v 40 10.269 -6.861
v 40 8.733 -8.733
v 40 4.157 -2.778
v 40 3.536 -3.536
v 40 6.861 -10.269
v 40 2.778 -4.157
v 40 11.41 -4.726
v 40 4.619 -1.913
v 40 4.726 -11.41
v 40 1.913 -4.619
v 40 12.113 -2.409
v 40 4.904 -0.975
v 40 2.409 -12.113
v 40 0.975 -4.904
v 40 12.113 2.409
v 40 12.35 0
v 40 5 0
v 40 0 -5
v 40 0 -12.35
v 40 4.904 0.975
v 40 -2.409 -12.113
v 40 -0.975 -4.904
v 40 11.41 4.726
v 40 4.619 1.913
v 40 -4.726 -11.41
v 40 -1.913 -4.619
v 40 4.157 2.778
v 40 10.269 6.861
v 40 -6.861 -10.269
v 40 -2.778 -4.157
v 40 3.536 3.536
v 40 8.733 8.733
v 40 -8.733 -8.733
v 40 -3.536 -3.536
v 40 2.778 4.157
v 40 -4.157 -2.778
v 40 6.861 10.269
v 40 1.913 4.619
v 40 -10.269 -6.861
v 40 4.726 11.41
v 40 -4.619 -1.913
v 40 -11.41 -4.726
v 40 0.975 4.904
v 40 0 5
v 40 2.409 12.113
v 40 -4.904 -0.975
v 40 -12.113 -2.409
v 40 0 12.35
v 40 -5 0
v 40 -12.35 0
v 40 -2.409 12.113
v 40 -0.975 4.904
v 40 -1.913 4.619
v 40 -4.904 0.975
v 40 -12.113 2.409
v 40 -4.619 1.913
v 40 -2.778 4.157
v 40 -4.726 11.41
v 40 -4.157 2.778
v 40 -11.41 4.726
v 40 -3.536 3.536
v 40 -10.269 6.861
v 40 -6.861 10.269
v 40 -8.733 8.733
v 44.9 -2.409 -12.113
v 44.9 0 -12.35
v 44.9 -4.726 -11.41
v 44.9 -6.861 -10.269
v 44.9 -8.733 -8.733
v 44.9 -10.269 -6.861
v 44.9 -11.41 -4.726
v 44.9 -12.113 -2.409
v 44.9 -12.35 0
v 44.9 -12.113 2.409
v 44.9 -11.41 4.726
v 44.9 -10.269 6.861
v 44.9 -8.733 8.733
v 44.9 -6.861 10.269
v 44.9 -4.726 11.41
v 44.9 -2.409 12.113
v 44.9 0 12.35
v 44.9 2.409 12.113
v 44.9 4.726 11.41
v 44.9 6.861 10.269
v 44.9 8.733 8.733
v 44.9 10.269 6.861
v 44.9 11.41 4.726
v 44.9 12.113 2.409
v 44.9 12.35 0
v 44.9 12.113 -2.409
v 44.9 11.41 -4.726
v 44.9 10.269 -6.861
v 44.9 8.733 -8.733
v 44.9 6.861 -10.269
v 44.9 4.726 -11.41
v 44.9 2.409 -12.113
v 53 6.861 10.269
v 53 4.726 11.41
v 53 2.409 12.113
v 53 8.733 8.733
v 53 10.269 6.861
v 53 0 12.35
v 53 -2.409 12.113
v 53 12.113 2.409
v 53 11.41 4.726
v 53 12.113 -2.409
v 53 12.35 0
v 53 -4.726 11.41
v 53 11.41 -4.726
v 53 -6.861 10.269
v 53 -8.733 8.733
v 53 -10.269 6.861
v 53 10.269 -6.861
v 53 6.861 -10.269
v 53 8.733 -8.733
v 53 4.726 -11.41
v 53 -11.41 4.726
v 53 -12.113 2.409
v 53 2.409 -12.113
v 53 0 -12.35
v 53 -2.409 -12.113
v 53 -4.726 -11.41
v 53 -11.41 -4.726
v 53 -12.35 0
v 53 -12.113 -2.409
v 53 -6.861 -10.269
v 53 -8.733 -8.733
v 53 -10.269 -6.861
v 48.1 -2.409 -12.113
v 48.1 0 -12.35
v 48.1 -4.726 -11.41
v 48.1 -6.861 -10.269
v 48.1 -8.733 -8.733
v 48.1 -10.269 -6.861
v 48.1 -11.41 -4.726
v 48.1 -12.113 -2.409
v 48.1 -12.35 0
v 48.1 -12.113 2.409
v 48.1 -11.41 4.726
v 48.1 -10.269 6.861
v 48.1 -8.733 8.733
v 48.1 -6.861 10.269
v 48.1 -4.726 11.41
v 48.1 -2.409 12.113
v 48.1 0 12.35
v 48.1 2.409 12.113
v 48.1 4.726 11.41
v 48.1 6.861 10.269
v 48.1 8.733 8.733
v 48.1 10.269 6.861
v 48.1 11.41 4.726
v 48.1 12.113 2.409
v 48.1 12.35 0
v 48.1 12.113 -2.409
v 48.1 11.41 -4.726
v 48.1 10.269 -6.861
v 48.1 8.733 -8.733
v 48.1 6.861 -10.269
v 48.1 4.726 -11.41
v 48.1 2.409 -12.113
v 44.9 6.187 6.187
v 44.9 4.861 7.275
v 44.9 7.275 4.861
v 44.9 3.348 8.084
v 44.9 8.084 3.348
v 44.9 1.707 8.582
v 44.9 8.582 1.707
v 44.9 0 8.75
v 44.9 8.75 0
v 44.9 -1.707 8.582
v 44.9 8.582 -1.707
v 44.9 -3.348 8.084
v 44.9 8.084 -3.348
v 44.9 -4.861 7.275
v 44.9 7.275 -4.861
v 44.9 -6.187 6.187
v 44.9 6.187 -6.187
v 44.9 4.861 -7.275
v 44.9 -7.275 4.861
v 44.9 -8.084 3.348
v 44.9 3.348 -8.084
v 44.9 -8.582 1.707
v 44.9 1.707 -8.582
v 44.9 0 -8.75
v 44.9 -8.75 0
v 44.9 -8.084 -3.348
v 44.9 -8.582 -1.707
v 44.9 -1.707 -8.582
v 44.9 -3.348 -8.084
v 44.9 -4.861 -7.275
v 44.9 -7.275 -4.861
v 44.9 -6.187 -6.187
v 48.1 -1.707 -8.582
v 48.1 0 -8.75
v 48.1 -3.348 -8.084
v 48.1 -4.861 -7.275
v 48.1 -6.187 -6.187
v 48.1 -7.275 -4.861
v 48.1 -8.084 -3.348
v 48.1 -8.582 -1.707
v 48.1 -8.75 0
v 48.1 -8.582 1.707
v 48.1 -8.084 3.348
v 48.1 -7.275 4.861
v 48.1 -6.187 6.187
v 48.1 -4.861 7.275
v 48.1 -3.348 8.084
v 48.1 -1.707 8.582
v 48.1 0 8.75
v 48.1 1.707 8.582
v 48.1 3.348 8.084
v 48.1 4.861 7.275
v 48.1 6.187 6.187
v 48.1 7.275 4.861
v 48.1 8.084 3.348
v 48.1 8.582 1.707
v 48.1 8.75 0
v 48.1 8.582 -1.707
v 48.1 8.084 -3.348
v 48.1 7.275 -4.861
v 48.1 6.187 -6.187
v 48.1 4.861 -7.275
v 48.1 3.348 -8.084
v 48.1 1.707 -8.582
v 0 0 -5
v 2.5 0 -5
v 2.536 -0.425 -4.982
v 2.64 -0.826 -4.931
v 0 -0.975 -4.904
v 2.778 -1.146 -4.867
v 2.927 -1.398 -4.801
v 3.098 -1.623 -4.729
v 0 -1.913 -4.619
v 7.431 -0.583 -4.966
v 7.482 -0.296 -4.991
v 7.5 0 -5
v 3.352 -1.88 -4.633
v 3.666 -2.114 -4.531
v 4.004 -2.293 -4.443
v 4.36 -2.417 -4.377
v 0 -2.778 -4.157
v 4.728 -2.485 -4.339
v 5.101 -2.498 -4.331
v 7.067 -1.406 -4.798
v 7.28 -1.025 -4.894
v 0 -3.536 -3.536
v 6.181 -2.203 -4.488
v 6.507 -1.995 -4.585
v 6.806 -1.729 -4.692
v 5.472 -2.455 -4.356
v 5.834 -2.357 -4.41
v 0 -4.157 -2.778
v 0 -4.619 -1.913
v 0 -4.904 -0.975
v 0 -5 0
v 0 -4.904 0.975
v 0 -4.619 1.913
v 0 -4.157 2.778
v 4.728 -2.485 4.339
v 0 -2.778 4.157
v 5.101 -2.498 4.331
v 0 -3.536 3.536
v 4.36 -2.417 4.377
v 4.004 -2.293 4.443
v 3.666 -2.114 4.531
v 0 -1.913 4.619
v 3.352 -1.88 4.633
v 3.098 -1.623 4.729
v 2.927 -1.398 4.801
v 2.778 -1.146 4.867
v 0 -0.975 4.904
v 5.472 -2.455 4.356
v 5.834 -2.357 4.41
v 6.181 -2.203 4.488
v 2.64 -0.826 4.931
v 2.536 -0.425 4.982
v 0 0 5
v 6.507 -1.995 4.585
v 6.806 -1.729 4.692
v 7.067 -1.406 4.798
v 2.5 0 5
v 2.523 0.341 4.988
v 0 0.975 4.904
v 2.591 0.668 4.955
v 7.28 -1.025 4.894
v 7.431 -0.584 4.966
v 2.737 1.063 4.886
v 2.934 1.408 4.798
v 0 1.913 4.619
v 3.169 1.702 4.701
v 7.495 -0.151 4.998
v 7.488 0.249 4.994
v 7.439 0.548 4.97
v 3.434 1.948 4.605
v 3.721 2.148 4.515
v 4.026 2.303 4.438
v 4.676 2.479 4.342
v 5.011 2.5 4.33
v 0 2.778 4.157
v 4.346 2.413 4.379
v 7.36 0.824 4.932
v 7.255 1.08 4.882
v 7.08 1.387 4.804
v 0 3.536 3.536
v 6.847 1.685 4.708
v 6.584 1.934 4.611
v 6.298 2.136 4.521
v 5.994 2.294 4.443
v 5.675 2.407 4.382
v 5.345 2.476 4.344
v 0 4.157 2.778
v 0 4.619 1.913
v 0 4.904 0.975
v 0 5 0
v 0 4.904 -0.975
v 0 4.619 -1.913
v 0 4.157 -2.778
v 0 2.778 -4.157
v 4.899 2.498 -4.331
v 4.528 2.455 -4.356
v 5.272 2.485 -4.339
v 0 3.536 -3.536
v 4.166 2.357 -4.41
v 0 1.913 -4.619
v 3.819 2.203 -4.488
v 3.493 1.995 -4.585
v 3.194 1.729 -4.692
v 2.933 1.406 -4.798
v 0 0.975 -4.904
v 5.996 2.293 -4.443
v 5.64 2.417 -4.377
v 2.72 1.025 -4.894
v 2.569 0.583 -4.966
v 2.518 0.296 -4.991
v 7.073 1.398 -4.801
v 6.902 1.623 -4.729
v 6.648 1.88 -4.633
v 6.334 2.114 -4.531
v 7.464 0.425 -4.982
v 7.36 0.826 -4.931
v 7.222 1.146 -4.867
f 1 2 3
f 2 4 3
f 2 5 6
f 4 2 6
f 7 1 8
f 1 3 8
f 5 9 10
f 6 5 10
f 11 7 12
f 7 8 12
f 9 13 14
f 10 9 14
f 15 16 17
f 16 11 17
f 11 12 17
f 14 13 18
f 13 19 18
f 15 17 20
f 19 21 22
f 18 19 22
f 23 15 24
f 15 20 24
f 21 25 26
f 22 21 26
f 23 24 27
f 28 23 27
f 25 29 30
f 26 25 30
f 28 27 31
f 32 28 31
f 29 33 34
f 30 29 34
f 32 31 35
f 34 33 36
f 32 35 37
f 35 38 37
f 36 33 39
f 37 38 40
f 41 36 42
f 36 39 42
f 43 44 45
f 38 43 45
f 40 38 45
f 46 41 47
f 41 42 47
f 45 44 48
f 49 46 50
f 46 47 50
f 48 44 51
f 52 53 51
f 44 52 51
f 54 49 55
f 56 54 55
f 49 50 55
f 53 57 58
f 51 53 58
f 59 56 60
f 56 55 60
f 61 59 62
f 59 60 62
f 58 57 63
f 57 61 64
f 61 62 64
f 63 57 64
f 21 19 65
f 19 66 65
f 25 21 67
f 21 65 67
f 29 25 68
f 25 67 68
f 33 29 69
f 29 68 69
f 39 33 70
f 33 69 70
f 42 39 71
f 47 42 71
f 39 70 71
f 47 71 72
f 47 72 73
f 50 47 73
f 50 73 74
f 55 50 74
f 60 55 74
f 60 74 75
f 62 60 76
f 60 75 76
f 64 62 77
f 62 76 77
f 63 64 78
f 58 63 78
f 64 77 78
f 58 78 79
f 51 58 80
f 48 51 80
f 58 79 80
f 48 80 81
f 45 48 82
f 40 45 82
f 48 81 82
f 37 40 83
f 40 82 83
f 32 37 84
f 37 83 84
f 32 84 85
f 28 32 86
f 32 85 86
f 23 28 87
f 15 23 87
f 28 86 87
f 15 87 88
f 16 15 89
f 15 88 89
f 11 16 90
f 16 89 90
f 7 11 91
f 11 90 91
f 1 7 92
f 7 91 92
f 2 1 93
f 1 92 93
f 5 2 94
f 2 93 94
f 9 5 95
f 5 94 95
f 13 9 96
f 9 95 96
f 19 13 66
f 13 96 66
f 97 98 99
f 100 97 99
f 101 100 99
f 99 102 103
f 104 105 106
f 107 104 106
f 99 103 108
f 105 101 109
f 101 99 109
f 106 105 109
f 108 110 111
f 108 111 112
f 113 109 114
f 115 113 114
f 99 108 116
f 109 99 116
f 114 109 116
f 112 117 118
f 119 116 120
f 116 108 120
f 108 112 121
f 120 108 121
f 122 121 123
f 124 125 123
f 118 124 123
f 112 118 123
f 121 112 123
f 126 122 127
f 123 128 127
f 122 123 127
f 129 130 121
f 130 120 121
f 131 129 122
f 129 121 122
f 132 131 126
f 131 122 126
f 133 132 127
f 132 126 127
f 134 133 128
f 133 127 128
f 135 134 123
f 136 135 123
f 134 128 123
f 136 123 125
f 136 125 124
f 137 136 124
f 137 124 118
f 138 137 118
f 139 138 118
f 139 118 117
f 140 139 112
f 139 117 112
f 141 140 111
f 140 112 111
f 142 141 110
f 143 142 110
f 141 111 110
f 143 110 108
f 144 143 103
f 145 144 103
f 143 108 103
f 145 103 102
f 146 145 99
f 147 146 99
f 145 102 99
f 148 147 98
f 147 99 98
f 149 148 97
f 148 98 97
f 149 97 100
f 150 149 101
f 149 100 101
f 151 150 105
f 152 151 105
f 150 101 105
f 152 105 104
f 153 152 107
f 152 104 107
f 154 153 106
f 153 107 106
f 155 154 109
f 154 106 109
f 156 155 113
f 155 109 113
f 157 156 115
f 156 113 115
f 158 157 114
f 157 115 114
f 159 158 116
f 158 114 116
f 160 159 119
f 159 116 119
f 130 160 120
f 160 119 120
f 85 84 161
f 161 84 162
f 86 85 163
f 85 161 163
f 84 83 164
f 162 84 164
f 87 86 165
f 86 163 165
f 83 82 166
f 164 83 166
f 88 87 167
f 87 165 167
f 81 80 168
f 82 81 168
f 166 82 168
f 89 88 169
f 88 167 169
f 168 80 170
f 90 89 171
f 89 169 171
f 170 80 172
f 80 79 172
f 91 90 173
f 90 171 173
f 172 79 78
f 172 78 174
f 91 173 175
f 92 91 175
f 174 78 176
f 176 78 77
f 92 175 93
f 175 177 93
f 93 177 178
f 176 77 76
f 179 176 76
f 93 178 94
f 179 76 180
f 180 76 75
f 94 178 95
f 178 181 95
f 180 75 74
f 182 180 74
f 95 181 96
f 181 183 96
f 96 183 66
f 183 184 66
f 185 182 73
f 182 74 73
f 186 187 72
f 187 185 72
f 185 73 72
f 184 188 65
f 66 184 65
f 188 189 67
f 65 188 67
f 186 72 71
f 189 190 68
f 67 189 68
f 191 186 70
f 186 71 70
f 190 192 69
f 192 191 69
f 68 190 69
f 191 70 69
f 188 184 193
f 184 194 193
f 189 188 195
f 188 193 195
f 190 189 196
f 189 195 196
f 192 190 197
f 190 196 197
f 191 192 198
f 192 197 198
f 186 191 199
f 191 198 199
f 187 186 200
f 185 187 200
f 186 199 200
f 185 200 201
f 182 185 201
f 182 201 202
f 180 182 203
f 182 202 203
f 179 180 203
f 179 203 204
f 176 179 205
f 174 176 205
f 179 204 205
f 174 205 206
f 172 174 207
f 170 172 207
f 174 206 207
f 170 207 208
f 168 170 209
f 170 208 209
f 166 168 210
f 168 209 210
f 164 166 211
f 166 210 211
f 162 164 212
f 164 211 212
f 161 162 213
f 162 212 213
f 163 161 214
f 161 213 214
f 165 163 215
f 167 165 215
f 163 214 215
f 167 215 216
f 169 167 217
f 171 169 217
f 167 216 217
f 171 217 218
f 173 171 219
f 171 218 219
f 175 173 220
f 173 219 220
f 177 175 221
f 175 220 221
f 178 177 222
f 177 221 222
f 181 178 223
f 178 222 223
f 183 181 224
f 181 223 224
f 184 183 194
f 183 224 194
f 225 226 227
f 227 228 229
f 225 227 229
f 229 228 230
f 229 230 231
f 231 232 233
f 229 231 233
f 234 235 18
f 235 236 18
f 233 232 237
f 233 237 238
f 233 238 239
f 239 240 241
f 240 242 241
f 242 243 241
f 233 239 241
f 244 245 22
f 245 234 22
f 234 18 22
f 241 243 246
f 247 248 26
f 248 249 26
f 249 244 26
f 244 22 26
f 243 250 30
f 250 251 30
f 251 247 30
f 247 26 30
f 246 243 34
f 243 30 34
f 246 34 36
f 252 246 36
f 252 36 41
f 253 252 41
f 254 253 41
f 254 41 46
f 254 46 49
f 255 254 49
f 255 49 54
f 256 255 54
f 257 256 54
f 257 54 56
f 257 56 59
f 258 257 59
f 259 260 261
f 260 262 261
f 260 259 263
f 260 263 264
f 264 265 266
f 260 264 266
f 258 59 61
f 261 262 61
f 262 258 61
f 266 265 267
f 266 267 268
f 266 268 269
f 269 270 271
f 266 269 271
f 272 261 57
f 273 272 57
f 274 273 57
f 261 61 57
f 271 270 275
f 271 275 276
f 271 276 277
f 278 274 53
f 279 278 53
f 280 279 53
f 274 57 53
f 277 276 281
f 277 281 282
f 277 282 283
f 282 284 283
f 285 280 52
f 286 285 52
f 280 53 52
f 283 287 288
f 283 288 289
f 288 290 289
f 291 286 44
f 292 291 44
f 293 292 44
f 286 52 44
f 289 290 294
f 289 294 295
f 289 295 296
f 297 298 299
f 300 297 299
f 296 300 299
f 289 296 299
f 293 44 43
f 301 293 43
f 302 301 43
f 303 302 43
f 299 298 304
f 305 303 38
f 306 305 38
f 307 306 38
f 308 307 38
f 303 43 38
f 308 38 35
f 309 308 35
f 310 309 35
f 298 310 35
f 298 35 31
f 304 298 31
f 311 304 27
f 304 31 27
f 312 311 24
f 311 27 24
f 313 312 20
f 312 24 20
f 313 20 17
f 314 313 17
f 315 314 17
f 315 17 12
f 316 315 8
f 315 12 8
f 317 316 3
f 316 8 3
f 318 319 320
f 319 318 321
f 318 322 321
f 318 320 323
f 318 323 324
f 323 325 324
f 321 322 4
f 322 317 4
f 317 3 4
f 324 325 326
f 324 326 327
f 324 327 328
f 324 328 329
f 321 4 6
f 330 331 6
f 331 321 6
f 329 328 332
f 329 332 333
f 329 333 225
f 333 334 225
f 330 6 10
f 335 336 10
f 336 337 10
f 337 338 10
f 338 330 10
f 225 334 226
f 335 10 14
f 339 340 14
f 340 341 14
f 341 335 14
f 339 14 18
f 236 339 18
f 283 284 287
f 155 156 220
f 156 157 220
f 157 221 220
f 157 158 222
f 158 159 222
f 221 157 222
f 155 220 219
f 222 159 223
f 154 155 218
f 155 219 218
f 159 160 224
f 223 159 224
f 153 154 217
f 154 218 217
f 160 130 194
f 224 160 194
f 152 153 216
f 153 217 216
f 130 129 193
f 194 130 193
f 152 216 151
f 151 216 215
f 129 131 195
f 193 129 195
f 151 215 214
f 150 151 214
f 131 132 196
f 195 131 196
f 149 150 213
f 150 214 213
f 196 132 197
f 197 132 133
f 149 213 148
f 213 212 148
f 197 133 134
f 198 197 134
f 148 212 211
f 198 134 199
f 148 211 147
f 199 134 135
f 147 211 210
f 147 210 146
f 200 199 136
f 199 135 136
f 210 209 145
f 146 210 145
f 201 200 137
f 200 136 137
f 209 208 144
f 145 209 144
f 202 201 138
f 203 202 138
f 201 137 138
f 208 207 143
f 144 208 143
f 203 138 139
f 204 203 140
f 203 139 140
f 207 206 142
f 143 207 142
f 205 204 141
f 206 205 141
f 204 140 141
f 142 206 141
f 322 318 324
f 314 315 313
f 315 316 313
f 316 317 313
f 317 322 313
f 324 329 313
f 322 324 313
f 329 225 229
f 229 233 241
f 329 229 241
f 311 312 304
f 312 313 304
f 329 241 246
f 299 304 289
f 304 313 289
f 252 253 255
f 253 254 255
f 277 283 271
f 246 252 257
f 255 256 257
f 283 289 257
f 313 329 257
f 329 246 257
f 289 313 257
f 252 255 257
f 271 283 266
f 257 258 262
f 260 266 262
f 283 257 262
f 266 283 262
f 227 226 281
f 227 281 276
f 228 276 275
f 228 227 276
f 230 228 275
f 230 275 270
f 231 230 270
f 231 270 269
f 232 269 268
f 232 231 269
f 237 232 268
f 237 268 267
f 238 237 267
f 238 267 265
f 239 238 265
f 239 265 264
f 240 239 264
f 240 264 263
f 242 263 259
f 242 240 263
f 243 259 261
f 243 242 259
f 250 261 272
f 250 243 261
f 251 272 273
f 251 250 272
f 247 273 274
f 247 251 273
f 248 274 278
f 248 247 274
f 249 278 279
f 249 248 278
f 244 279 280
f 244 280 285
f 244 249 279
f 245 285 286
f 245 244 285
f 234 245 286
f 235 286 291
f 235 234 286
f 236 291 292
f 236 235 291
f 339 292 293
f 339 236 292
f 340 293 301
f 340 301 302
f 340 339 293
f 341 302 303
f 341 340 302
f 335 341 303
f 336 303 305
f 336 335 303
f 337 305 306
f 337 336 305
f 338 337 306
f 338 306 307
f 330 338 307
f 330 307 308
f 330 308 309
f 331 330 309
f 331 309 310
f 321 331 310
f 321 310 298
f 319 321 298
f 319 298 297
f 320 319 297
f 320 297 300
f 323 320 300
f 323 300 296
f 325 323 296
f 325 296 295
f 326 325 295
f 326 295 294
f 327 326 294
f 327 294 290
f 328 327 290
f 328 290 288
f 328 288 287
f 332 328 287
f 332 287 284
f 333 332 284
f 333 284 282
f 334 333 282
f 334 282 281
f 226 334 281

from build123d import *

# Parameters (mm, degrees)
CUT_EXTRUDE1_DEPTH      = 10
CUT_EXTRUDE1_DEPTH_BACK = 10
SKETCH2_R               = 2.5


with BuildPart() as part:
    # Sketch1 → Revolve1 (revolve)
    with BuildSketch(Plane.XY, mode=Mode.PRIVATE) as revolve1_sk:
        Polygon((0, 0), (0, 5), (40, 5), (40, 12.35), (44.9, 12.35), (44.9, 8.75), (48.1, 8.75), (48.1, 12.35), (53, 12.35), (53, 0), align=None)
    revolve(revolve1_sk.sketch.rotate(Axis((53, 0, 0), (-1, 0, 0)), 90), axis=Axis((53, 0, 0), (-1, 0, 0)))

    # Sketch2 → Cut-Extrude1 (cut, two sides: drawn at the far end of the back side and taken through both)
    with BuildSketch(Plane.XY.offset(-CUT_EXTRUDE1_DEPTH_BACK)):
        with Locations(Location((5, 0, 0), (0, 0, 180))):
            Circle(SKETCH2_R)
    extrude(amount=CUT_EXTRUDE1_DEPTH + CUT_EXTRUDE1_DEPTH_BACK, mode=Mode.SUBTRACT)


solid = part.part
